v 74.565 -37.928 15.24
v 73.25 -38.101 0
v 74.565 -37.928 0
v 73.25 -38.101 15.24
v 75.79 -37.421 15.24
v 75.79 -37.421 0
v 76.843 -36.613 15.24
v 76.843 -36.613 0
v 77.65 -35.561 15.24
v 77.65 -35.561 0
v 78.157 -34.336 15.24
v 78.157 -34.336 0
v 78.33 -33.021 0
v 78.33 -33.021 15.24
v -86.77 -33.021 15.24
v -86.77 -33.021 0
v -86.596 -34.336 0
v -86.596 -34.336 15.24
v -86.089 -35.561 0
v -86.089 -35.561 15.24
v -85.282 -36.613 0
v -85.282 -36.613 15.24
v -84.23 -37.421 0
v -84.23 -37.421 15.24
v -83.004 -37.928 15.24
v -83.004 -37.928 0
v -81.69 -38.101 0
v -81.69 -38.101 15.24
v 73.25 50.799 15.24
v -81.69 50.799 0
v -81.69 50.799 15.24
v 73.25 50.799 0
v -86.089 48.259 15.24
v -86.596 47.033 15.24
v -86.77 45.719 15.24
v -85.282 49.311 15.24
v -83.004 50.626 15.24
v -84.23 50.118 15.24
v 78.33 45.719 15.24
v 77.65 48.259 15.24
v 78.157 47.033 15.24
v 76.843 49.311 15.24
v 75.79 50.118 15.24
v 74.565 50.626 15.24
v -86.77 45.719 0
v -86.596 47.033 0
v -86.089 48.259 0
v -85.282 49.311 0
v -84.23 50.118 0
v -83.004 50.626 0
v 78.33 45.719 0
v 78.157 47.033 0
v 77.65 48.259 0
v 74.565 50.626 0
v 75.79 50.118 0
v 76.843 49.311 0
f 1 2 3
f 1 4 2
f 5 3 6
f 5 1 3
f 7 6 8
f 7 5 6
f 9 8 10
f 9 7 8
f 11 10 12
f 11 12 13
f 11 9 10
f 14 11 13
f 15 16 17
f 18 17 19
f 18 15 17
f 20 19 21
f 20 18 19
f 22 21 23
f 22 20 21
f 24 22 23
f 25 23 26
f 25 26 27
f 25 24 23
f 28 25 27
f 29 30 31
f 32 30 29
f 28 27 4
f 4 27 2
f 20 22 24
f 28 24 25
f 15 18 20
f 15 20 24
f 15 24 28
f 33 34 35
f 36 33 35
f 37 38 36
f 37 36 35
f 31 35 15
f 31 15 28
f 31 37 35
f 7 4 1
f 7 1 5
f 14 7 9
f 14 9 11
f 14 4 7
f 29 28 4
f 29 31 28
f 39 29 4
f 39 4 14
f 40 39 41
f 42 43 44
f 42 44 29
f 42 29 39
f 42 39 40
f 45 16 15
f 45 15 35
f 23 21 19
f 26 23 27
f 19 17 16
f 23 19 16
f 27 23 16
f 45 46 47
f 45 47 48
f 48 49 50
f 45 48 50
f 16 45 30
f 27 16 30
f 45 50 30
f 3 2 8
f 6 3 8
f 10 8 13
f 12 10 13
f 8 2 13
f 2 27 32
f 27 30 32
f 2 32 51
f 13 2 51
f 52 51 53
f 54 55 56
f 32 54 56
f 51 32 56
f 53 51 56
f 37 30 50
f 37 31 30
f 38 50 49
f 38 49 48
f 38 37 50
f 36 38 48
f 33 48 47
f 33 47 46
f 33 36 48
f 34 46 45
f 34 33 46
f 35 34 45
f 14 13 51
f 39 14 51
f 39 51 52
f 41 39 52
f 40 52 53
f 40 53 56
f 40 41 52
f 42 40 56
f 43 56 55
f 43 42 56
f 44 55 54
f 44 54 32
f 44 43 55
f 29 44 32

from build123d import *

# Parameters (mm, degrees)
F0_W     = 165.1
F0_H     = 88.9
F1_DEPTH = 15.24
F2_R     = 5.08
F3_R     = 5.08
F4_R     = 5.08
F5_R     = 5.08


with BuildPart() as f1:
    # F0 (on Top) → F1 (new body)
    with BuildSketch(Plane.XY):
        with Locations((-4.219595, 6.348646)):
            Rectangle(F0_W, F0_H)
    extrude(amount=F1_DEPTH)

    # F2
    f2_edges = [f1.edges().sort_by_distance(p)[0] for p in [
        (-86.769595, -38.101354, 7.62),
    ]]
    fillet(f2_edges, radius=F2_R)

    # F3
    f3_edges = [f1.edges().sort_by_distance(p)[0] for p in [
        (78.330405, -38.101354, 7.62),
    ]]
    fillet(f3_edges, radius=F3_R)

    # F4
    f4_edges = [f1.edges().sort_by_distance(p)[0] for p in [
        (78.330405, 50.798646, 7.62),
    ]]
    fillet(f4_edges, radius=F4_R)

    # F5
    f5_edges = [f1.edges().sort_by_distance(p)[0] for p in [
        (-86.769595, 50.798646, 7.62),
    ]]
    fillet(f5_edges, radius=F5_R)


solid = f1.part
